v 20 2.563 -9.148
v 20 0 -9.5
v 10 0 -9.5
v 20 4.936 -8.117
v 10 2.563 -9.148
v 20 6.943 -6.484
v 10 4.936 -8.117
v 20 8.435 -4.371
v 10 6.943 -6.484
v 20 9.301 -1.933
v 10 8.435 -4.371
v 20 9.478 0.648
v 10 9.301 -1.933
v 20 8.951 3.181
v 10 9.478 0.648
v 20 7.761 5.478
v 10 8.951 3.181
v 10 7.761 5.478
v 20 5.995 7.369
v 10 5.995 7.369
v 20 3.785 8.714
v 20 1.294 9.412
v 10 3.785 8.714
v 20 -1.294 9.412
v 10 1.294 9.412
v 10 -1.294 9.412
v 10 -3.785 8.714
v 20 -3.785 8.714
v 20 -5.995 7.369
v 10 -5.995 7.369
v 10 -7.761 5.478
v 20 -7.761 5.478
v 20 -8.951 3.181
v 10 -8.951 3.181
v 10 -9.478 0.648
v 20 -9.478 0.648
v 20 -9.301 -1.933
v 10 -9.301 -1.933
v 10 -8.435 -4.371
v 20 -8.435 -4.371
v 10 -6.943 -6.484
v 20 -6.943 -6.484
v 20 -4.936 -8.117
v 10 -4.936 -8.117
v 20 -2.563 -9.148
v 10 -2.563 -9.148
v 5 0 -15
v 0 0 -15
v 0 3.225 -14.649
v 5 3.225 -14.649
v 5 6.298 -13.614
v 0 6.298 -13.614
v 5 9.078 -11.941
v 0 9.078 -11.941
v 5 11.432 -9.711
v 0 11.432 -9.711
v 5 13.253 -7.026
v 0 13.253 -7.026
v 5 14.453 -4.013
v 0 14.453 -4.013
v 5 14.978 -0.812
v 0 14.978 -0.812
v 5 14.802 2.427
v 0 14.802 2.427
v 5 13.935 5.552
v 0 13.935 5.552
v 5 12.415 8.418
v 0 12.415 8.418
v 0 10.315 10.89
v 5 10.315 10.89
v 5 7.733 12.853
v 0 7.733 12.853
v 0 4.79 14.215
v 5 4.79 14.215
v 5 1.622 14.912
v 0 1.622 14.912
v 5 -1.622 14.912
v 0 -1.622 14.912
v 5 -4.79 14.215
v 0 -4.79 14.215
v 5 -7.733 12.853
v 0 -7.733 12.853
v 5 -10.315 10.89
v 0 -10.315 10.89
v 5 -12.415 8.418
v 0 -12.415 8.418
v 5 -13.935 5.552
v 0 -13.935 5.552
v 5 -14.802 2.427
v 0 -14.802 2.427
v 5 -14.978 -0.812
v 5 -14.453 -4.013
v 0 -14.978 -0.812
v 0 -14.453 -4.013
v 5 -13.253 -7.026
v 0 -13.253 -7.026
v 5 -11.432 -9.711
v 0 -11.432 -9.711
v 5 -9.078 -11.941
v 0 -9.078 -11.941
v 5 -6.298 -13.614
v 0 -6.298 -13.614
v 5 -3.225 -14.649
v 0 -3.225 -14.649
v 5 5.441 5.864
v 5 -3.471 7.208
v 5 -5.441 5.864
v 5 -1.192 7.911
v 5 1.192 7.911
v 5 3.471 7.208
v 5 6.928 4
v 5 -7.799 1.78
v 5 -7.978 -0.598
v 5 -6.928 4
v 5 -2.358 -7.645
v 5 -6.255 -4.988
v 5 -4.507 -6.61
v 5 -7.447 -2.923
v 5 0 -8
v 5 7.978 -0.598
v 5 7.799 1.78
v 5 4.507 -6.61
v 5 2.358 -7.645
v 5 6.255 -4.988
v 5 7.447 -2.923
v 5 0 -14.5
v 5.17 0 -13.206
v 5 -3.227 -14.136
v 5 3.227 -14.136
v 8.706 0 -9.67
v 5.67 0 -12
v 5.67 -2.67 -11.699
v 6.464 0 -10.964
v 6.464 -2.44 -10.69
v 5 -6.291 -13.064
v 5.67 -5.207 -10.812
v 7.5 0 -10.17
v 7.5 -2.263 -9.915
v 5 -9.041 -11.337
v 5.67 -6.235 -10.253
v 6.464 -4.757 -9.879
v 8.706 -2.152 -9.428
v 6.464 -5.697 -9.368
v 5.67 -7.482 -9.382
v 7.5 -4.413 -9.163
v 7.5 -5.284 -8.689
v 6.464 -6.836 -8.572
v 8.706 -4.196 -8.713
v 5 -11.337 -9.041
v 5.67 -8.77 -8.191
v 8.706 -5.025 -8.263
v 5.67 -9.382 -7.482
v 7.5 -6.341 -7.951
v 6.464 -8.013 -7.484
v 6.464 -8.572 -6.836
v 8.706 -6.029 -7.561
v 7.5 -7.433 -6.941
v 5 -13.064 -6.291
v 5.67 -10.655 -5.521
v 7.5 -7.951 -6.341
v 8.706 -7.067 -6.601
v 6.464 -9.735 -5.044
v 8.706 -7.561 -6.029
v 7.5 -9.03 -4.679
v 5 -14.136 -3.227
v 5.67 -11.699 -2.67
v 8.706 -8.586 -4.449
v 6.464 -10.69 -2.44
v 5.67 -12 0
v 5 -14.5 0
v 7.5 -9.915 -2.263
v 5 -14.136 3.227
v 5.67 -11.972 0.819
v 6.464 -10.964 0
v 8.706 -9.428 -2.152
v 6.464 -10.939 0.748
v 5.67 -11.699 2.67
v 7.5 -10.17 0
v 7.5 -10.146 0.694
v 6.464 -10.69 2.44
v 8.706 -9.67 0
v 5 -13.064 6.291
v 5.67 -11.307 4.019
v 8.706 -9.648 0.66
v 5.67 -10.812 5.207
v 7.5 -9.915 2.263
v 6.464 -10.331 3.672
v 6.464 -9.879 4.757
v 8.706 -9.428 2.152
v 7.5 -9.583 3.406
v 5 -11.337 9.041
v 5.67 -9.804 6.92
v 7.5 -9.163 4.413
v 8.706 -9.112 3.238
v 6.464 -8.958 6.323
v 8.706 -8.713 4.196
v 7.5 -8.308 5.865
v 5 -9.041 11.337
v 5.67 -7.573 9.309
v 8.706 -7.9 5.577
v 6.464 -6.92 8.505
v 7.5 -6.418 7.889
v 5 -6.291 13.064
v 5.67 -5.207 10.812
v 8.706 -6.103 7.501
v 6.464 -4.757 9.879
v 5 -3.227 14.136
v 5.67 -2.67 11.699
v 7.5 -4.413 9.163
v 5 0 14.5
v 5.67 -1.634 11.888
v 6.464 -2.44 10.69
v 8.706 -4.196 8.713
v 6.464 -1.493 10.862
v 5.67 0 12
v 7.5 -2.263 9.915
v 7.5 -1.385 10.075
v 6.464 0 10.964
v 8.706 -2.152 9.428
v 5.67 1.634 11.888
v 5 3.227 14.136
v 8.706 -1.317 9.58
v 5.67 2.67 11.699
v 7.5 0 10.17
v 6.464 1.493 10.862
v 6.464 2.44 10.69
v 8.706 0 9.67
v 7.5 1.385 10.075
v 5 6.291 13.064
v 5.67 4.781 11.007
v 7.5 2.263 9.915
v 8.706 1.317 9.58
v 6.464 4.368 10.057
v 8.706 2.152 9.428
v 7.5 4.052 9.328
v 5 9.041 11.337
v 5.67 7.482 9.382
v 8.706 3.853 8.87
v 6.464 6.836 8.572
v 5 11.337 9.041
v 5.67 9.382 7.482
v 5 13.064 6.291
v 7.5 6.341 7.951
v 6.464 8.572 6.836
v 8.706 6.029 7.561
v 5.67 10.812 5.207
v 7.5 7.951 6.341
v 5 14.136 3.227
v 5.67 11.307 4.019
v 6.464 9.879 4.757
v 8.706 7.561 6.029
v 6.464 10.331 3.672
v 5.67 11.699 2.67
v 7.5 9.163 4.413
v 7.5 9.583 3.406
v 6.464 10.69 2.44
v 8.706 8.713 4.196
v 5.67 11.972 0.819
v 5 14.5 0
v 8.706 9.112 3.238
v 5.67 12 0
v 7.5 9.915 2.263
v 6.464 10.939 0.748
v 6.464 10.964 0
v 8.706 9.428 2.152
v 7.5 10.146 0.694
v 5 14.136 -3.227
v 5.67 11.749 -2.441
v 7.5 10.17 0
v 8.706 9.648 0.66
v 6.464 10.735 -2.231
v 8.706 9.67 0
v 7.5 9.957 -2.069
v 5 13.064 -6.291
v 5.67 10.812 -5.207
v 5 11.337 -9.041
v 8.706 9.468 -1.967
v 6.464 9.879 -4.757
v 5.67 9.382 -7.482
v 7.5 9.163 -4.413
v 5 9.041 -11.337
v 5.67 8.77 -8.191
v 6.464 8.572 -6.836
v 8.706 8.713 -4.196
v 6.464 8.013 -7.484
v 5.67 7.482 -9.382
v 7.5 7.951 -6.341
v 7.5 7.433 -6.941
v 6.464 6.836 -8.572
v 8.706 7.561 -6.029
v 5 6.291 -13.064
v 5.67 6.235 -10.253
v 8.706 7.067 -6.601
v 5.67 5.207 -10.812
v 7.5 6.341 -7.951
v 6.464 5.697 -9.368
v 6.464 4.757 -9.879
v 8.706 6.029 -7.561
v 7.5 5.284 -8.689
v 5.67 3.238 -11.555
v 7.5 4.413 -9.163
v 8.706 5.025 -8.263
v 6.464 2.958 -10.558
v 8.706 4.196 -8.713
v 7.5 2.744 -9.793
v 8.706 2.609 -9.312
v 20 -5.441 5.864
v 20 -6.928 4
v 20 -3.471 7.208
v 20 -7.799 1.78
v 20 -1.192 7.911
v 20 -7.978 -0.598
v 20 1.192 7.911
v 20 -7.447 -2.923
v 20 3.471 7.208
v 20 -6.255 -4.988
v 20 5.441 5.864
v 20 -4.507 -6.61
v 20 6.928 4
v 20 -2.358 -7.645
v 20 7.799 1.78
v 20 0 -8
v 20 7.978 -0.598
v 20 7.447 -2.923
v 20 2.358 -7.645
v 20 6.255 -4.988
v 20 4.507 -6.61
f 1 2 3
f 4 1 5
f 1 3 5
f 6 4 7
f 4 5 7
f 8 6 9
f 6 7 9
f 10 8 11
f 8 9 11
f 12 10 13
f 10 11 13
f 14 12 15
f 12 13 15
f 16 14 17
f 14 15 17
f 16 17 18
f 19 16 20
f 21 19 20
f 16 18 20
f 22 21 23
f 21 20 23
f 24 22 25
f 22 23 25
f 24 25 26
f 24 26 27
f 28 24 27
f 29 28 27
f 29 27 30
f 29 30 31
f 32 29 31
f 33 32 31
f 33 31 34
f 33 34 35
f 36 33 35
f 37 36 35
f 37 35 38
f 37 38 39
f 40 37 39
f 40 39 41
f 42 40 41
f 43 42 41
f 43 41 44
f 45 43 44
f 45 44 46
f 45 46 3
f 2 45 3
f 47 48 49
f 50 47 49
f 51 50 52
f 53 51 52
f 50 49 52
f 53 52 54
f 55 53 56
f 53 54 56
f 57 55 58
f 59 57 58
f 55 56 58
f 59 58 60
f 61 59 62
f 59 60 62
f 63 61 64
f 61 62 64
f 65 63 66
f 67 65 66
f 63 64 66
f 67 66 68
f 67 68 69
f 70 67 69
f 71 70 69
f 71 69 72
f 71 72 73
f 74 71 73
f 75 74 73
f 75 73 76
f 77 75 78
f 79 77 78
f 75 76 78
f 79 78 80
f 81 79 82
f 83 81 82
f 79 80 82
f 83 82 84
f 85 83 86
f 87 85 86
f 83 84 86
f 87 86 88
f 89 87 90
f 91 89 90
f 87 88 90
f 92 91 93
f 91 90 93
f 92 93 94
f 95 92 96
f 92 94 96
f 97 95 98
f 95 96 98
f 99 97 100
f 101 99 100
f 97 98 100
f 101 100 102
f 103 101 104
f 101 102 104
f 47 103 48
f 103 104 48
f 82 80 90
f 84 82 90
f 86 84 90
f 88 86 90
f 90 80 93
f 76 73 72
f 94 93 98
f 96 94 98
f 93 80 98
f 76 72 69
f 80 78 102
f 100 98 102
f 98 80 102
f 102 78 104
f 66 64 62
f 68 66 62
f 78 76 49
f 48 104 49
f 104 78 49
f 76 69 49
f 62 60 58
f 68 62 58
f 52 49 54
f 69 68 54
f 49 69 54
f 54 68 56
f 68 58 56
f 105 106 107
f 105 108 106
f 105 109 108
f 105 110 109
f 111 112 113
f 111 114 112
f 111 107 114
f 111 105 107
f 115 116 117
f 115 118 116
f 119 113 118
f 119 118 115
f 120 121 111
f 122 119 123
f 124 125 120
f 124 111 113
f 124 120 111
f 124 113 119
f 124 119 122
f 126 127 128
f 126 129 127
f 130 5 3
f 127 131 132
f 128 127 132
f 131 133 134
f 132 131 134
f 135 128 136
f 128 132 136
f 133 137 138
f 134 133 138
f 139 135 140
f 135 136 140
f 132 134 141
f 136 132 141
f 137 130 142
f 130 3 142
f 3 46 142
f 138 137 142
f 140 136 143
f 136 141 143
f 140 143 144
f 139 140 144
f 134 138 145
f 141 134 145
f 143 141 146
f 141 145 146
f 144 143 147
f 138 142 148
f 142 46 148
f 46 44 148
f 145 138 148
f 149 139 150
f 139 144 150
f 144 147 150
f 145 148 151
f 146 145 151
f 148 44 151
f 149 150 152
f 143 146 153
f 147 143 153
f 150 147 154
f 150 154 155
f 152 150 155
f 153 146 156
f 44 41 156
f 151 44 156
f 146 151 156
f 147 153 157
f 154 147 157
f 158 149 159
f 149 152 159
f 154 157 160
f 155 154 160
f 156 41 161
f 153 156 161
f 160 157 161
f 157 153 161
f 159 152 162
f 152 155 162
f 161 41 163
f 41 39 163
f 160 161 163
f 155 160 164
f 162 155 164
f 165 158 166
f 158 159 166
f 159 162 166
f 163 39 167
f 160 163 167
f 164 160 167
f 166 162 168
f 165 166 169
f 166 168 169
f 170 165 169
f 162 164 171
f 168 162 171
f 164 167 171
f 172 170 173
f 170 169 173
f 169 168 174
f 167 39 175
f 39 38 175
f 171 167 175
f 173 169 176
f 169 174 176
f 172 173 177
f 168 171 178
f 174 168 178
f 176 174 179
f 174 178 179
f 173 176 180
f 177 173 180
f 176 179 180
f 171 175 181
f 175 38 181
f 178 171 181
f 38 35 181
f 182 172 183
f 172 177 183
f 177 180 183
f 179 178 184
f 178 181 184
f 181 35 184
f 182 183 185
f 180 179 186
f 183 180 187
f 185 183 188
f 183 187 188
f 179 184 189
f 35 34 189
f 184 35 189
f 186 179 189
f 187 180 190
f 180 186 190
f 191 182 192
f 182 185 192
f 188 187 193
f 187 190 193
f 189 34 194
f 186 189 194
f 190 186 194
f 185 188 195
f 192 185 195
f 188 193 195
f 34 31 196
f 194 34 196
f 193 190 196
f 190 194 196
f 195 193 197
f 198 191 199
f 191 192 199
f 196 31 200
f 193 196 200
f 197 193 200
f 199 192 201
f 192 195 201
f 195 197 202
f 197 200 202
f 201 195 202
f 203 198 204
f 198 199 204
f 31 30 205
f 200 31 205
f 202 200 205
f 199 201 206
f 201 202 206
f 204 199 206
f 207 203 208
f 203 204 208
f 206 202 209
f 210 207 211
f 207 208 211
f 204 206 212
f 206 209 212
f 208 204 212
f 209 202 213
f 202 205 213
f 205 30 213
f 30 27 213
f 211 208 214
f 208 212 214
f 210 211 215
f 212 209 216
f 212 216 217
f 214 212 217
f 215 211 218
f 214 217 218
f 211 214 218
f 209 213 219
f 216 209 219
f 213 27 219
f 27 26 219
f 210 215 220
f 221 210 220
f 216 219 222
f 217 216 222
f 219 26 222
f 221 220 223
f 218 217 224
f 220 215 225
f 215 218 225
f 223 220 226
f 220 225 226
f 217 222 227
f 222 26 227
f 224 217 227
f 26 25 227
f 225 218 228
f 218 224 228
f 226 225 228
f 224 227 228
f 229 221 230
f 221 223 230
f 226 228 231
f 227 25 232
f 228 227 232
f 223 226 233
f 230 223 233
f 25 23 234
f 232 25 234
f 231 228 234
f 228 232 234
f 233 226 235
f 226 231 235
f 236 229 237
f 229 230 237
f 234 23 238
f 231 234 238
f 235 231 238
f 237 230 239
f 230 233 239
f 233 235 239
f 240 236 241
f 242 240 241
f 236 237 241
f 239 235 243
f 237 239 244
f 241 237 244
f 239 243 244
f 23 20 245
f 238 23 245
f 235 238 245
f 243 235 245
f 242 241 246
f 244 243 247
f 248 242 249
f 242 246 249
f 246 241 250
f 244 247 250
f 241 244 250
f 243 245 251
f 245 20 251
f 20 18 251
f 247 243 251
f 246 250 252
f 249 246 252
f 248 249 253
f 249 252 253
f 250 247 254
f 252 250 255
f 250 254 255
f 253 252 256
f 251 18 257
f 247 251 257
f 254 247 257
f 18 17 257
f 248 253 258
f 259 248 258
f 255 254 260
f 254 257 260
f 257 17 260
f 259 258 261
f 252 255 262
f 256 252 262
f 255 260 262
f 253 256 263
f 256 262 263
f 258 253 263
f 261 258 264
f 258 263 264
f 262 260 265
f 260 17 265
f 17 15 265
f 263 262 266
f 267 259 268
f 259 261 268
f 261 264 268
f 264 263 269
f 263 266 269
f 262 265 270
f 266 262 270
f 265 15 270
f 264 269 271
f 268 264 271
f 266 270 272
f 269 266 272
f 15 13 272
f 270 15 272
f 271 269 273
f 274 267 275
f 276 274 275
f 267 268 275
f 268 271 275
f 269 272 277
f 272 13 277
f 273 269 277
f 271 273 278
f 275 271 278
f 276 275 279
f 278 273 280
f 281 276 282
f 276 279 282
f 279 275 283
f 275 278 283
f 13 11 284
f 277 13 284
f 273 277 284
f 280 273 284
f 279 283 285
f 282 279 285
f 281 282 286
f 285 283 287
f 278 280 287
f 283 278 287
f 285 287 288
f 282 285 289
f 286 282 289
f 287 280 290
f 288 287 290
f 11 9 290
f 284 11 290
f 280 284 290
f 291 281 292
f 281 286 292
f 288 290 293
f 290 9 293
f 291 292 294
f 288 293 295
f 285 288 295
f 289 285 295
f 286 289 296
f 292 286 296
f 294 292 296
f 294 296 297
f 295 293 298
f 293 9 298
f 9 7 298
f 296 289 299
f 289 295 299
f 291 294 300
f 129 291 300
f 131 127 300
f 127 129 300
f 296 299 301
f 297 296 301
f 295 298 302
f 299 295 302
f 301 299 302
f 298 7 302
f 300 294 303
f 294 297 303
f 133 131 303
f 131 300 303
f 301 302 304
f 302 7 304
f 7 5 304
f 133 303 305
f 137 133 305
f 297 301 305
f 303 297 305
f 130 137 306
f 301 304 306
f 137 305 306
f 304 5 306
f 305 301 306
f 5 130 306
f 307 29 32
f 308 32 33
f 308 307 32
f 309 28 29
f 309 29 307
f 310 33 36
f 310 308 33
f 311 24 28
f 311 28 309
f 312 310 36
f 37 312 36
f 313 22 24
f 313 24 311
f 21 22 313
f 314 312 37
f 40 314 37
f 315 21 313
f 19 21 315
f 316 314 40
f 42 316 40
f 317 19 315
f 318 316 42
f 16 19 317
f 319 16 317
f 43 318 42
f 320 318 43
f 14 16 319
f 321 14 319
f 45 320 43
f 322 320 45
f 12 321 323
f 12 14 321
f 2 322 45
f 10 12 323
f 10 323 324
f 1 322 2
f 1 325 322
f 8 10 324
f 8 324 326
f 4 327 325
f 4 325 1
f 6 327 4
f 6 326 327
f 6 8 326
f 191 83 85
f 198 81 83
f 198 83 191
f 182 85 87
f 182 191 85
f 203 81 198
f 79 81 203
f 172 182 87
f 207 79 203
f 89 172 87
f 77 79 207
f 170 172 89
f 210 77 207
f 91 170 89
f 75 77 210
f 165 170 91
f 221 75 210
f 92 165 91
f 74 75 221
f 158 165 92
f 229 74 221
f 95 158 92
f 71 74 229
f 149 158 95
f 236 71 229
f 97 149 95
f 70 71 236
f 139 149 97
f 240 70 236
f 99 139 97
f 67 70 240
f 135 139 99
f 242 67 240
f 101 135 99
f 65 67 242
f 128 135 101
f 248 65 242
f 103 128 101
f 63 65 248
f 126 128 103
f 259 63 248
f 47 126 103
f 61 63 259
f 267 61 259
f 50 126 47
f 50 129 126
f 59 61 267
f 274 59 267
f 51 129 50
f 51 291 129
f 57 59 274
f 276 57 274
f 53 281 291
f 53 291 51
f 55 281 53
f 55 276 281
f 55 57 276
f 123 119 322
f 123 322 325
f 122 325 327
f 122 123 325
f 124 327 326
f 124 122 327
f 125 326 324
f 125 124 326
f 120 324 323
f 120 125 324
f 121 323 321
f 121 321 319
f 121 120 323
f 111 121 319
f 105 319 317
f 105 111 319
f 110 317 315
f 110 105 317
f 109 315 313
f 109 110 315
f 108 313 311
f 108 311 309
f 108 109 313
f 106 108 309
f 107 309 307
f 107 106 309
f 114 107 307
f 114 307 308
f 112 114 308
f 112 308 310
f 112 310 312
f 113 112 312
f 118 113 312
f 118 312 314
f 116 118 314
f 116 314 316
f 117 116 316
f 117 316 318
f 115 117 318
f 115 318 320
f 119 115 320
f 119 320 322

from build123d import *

# Parameters (mm, degrees)
SCHIZZO1_R                   = 9.5
SCHIZZO1_R_2                 = 8
ESTRUSIONE_ESTRUSIONE1_DEPTH = 20
SCHIZZO2_R                   = 15
ESTRUSIONE_ESTRUSIONE2_DEPTH = 5
RACCORDO1_R                  = 5


with BuildPart() as part:
    # Schizzo1 → Estrusione-Estrusione1 (new body)
    with BuildSketch(Plane(origin=(0, 0, 0), x_dir=(0, 0, -1), z_dir=(1, 0, 0))):
        Circle(SCHIZZO1_R)
        Circle(SCHIZZO1_R_2, mode=Mode.SUBTRACT)
    extrude(amount=ESTRUSIONE_ESTRUSIONE1_DEPTH)

    # Schizzo2 → Estrusione-Estrusione2 (add)
    with BuildSketch(Plane(origin=(0, 0, 0), x_dir=(0, 0, -1), z_dir=(1, 0, 0))):
        Circle(SCHIZZO2_R)
    extrude(amount=ESTRUSIONE_ESTRUSIONE2_DEPTH)

    # Raccordo1
    raccordo1_edges = [part.edges().sort_by_distance(p)[0] for p in [
        (5, 0, 9.5),
    ]]
    fillet(raccordo1_edges, radius=RACCORDO1_R)


solid = part.part
